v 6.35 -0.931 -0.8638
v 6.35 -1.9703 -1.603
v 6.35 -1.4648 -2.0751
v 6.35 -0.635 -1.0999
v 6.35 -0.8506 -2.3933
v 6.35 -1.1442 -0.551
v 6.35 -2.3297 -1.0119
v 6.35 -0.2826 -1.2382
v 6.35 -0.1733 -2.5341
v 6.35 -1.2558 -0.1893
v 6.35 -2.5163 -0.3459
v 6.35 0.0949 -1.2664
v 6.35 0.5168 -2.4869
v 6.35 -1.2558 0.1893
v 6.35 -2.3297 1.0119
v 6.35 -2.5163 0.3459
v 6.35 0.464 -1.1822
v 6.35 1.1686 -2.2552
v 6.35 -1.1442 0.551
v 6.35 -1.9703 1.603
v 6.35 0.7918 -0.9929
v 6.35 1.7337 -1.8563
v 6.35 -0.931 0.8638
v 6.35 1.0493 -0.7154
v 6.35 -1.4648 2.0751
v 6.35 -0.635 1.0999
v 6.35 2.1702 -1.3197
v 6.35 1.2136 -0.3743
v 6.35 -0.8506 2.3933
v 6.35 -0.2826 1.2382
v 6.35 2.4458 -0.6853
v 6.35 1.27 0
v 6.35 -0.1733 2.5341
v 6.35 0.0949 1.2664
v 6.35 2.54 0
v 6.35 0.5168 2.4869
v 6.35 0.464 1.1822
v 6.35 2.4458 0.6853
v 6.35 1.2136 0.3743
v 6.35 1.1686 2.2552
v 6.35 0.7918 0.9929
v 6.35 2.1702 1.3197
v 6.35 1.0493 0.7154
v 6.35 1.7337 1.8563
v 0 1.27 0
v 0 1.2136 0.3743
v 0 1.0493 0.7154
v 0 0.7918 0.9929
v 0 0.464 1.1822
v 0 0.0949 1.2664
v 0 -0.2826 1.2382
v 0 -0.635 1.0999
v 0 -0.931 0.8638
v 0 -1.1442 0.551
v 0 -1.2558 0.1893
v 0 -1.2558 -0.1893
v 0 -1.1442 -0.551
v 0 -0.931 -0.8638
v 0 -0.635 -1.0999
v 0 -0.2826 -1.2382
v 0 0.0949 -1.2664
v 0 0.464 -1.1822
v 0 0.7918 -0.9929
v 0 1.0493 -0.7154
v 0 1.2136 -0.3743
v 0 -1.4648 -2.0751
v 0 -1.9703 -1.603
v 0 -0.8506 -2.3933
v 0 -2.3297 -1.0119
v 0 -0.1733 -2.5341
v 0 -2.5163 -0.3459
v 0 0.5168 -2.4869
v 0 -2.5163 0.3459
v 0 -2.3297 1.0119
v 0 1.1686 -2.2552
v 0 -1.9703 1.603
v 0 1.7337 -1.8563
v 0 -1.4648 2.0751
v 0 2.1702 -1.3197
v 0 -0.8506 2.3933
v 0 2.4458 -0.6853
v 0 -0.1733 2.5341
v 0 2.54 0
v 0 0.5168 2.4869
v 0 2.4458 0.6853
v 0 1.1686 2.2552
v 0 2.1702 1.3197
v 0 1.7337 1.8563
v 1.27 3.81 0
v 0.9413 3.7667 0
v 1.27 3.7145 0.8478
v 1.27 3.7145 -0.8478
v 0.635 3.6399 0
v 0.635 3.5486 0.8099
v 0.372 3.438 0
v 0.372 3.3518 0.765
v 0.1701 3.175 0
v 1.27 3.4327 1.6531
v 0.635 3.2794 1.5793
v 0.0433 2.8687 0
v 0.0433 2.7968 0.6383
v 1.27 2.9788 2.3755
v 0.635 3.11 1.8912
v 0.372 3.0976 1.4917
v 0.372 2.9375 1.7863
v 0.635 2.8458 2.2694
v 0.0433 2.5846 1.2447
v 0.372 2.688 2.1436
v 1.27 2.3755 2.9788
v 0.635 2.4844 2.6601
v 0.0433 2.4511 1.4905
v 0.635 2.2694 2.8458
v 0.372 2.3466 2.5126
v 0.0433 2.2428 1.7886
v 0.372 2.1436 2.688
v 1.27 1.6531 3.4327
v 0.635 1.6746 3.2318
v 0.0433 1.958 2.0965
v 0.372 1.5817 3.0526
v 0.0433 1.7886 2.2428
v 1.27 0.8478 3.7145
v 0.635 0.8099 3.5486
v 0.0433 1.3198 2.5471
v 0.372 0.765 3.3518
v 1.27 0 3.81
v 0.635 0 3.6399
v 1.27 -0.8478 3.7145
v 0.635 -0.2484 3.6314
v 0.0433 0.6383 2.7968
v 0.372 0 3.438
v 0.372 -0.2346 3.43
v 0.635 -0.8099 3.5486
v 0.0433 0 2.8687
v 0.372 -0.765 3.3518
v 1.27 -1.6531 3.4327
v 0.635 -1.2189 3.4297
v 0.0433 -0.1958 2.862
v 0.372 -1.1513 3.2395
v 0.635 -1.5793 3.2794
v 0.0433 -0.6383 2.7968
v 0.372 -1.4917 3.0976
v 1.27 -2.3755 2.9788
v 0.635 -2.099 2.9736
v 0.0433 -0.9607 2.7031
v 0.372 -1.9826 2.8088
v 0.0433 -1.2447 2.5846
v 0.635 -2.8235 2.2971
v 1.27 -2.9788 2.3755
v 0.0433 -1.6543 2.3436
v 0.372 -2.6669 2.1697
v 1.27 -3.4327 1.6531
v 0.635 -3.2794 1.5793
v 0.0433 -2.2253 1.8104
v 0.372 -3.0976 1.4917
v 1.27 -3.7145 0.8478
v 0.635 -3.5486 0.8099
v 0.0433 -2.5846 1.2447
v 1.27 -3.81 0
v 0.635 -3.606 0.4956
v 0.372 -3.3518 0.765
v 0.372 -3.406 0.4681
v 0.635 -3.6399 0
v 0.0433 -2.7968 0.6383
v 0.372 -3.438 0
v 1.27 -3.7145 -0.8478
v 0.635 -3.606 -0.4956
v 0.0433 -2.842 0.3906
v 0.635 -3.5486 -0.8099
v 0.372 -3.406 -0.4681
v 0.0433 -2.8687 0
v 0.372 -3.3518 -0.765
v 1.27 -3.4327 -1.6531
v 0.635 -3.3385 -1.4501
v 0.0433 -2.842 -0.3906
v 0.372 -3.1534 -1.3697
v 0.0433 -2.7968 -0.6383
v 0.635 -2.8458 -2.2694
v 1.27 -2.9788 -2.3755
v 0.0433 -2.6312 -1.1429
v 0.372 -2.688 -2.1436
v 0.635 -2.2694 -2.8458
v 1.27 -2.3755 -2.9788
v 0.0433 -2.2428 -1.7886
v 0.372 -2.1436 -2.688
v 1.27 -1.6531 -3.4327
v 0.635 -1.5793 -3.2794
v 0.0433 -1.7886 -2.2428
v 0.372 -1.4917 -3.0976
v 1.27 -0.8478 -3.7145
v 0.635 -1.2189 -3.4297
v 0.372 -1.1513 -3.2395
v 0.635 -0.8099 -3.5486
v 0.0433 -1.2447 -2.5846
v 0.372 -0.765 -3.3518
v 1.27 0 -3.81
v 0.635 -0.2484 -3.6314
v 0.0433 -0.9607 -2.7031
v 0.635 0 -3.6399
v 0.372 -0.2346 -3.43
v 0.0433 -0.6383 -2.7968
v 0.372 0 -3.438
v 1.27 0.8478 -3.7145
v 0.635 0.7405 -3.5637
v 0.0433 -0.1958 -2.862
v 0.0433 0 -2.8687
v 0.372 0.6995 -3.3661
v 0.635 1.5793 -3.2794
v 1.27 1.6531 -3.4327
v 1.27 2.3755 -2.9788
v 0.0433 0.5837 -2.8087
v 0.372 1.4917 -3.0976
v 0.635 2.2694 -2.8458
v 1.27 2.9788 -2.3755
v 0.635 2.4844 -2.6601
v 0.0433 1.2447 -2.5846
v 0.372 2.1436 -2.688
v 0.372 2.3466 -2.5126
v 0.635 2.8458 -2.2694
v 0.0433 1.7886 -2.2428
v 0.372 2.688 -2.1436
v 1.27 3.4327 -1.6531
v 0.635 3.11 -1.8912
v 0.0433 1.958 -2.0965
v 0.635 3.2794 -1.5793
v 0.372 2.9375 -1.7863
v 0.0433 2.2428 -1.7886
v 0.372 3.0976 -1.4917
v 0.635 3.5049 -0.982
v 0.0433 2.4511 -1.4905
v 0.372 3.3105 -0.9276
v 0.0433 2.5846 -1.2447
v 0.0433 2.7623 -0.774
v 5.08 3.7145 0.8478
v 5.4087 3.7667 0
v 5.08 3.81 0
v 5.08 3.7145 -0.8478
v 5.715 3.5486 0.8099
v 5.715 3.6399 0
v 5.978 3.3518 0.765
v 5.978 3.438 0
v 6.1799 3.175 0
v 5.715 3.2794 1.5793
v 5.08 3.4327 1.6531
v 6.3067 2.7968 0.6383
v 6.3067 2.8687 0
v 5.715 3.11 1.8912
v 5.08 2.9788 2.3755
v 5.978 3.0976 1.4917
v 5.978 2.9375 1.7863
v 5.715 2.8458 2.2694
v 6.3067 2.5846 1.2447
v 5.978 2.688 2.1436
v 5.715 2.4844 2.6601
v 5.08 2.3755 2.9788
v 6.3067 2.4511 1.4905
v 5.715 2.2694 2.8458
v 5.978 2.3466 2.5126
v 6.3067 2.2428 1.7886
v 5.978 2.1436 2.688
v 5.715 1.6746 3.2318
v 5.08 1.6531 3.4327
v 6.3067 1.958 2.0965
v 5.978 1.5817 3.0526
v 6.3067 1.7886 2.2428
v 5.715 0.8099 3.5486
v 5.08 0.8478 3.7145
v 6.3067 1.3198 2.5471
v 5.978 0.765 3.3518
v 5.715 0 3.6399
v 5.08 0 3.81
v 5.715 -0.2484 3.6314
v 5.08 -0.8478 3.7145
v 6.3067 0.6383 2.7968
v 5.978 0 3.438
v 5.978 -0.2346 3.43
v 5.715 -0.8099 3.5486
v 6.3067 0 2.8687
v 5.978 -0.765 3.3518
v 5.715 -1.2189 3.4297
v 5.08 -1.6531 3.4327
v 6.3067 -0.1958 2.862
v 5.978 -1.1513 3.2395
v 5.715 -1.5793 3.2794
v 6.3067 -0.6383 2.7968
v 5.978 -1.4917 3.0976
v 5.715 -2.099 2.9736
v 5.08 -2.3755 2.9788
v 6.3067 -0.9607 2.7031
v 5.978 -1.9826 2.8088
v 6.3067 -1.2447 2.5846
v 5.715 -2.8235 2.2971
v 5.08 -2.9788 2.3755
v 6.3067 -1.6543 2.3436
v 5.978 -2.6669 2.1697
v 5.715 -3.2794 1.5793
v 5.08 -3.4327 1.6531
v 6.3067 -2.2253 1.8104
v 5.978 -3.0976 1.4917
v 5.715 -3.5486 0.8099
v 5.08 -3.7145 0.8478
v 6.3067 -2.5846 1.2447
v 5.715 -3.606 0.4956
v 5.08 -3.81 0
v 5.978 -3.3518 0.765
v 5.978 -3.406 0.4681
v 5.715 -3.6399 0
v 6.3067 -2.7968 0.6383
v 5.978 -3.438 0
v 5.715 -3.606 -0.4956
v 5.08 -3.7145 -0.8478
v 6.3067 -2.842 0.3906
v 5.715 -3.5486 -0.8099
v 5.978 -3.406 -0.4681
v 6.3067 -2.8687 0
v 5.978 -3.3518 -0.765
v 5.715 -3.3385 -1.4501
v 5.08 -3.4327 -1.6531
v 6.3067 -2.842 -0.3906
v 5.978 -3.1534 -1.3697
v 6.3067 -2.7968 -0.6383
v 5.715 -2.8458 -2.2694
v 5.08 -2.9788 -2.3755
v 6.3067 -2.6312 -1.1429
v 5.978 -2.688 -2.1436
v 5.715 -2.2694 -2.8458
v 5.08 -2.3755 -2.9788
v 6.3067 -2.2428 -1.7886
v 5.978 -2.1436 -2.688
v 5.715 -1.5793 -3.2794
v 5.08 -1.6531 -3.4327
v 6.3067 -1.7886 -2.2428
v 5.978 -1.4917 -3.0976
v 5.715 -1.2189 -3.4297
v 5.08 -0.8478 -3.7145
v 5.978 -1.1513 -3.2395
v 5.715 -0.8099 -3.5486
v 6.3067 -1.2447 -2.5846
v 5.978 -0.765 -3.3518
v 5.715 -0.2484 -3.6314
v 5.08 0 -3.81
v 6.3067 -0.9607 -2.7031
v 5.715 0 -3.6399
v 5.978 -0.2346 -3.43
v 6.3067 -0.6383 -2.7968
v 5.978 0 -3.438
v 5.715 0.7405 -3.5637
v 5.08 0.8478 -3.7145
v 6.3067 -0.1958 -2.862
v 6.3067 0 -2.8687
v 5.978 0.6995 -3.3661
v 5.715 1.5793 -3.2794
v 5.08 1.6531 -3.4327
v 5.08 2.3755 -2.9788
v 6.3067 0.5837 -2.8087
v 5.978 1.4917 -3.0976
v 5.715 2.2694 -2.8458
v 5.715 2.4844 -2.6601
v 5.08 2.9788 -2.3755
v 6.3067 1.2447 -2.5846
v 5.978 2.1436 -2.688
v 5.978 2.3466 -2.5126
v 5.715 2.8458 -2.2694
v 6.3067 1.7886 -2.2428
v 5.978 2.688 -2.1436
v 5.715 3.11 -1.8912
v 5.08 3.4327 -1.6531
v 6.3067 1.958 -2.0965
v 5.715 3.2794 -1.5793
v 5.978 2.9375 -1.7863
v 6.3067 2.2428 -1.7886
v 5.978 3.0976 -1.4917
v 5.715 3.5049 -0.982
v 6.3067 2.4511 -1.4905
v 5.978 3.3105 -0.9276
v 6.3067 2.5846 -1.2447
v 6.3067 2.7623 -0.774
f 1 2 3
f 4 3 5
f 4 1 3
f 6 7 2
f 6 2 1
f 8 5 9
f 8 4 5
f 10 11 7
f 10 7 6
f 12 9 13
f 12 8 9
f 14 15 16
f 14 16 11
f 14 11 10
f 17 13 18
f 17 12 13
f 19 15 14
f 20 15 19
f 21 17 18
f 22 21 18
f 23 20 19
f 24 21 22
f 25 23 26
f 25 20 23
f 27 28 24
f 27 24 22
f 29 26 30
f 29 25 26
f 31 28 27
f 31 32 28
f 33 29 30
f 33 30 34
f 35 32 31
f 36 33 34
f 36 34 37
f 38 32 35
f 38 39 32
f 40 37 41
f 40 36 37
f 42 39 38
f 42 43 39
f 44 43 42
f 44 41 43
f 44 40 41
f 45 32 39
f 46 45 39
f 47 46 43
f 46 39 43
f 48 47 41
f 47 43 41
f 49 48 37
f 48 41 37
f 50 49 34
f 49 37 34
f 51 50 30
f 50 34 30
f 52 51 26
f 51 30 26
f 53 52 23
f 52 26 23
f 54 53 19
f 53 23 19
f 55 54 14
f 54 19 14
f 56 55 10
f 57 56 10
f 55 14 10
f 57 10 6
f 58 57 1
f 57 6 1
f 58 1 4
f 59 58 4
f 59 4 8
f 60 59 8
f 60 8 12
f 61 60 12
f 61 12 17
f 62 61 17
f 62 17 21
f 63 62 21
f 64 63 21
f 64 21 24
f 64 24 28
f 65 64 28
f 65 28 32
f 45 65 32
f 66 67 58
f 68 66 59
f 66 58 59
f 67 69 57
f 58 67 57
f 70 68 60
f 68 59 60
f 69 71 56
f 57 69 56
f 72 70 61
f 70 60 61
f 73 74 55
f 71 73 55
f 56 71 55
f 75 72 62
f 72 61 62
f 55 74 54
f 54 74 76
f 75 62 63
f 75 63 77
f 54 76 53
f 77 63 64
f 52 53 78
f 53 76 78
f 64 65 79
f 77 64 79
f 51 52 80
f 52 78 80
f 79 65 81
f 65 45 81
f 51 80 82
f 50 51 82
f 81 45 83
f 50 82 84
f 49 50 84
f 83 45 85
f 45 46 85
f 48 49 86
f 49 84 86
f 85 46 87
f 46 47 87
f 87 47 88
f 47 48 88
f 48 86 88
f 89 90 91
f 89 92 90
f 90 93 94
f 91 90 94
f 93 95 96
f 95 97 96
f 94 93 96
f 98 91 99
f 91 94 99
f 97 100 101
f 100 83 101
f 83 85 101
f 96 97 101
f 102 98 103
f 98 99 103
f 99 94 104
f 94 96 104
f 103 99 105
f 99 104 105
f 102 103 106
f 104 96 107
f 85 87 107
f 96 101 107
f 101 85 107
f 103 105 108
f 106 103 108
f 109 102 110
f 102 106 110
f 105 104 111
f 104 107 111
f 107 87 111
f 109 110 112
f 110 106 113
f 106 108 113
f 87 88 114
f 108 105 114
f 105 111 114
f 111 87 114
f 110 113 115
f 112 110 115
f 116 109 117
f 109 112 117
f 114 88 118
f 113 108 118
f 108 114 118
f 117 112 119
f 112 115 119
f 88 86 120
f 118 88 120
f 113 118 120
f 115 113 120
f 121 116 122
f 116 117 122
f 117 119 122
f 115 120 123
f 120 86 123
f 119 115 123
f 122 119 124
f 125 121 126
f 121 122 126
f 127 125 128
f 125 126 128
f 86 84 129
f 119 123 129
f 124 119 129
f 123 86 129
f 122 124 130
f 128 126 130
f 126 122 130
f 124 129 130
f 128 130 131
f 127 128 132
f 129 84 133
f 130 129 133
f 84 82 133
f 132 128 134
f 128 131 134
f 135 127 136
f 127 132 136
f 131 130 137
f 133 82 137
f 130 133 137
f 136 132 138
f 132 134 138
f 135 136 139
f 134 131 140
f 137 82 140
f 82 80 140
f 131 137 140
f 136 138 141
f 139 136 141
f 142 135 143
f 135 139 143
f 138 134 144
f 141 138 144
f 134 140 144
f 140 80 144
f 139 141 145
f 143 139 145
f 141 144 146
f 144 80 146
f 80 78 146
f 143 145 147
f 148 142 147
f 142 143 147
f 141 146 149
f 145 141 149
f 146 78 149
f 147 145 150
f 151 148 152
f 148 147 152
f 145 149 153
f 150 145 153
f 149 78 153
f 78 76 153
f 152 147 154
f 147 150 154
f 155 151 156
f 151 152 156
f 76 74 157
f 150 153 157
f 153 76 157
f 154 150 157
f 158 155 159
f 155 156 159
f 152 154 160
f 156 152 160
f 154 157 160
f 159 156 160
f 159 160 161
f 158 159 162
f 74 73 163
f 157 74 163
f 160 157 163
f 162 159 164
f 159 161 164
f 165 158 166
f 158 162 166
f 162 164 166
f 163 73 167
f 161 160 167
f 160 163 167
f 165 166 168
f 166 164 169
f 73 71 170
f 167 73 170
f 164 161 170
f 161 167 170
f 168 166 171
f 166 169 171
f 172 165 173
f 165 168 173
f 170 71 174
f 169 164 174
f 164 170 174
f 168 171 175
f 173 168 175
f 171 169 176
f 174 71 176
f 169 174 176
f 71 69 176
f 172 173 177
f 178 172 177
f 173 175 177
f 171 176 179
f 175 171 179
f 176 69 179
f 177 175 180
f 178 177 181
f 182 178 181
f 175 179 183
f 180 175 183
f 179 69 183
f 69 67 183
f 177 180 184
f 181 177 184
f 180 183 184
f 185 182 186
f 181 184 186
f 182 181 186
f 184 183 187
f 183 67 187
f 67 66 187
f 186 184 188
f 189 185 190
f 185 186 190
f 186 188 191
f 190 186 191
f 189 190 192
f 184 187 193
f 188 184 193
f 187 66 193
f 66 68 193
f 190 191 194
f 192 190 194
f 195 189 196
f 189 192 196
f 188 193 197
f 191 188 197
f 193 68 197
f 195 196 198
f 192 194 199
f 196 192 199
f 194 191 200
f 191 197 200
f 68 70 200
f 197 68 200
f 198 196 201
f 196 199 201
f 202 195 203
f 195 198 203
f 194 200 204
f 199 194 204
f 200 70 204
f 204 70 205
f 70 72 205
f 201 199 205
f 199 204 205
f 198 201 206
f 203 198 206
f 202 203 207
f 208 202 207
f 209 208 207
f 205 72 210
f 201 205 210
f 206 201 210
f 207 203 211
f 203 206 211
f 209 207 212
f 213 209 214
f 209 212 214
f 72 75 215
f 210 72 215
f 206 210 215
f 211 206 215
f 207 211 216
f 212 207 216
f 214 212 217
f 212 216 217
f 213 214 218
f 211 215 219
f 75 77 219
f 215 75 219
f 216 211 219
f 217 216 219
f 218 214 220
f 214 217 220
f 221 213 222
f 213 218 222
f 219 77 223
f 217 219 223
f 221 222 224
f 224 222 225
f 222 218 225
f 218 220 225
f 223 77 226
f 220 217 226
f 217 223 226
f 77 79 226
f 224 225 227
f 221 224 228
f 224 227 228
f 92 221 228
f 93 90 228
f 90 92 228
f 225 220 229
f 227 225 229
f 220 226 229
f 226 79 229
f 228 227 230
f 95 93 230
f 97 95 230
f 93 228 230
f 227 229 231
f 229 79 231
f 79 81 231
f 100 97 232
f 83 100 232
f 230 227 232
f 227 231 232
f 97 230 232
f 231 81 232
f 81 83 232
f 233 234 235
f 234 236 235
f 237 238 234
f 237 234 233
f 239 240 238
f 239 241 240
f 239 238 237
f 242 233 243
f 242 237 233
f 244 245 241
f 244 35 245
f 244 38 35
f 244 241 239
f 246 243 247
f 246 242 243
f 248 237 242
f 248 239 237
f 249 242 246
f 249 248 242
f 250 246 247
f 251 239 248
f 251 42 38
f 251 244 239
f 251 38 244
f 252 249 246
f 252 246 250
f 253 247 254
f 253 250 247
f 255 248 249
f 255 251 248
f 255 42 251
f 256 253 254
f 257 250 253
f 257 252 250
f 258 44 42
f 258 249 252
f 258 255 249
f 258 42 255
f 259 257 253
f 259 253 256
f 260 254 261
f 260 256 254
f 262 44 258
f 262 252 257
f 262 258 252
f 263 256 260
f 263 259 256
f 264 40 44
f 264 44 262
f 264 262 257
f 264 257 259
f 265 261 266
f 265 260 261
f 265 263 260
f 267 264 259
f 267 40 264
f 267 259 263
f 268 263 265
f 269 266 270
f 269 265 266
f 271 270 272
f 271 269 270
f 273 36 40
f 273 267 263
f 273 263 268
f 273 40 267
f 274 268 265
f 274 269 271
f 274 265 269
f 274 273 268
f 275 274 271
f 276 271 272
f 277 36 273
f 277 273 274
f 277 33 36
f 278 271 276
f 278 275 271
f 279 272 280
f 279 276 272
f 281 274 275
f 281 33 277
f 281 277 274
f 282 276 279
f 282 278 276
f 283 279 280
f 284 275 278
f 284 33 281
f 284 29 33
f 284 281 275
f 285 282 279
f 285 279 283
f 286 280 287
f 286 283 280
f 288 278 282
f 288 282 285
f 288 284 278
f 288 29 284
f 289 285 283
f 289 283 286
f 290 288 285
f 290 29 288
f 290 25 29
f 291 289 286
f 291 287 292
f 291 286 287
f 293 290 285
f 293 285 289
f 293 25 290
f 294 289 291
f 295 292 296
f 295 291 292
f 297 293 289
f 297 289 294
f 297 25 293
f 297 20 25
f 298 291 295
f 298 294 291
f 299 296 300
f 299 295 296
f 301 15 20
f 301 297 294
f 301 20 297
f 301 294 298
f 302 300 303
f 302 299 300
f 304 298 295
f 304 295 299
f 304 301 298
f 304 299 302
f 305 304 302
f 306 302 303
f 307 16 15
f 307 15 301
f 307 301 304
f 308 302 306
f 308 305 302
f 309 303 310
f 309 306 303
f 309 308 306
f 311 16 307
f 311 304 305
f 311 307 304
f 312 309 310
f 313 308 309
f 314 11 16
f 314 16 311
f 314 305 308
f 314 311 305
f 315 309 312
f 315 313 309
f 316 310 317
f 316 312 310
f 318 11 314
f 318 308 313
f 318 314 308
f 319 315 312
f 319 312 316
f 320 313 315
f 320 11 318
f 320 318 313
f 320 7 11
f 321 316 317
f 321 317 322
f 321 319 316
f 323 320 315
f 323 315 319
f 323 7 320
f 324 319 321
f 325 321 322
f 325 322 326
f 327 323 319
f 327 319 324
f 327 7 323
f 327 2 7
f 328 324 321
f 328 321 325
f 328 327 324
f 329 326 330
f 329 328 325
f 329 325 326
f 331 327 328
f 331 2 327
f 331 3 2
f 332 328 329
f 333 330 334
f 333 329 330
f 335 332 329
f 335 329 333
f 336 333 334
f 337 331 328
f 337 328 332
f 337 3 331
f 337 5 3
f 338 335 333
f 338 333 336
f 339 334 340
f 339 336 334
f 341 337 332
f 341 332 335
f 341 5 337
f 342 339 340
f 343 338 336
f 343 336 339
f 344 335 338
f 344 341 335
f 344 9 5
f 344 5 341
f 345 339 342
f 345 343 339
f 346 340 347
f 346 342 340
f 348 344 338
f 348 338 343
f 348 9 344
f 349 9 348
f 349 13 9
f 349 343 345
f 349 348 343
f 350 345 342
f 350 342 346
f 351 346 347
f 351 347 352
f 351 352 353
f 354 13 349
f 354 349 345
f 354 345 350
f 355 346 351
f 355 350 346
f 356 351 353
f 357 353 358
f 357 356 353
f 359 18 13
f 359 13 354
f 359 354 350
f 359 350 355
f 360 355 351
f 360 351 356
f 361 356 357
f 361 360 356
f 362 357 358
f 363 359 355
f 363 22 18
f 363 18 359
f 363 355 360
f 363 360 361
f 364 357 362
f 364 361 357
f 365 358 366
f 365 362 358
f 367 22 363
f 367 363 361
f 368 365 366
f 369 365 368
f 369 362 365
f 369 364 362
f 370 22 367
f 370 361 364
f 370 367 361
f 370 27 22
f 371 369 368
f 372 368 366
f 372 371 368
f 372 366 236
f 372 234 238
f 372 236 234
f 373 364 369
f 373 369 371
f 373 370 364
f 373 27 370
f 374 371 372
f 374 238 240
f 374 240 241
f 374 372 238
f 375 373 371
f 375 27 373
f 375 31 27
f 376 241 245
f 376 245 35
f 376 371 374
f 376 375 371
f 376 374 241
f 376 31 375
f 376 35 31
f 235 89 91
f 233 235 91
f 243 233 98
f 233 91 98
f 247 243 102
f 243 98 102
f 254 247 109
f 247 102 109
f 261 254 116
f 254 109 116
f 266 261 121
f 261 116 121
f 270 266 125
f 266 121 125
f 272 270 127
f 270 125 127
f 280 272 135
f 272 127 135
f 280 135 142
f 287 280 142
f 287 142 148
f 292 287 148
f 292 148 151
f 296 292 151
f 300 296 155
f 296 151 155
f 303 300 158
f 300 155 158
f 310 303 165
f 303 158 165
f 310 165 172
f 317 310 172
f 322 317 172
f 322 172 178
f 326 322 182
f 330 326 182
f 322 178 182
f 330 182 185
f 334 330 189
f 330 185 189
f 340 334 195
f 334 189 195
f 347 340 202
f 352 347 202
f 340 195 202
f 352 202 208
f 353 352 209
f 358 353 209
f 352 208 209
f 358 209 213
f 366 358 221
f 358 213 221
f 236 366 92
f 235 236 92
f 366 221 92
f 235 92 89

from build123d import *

# Parameters (mm, degrees)
F0_R     = 3.81
F1_DEPTH = 6.35
F2_R     = 1.27
F3_R     = 1.27
F4_DEPTH = 25.4


with BuildPart() as f1:
    # F0 (on Right) → F1 (new body)
    with BuildSketch(Plane.YZ):
        Circle(F0_R)
    extrude(amount=F1_DEPTH)

    # F2
    f2_edges = [f1.edges().sort_by_distance(p)[0] for p in [
        (6.35, -3.81, 0),
        (0, -3.81, 0),
    ]]
    fillet(f2_edges, radius=F2_R)

    # F3 (on face) → F4 (cut)
    with BuildSketch(Plane.YZ.offset(6.35)):
        Circle(F3_R)
    extrude(amount=-F4_DEPTH, mode=Mode.SUBTRACT)


solid = f1.part
